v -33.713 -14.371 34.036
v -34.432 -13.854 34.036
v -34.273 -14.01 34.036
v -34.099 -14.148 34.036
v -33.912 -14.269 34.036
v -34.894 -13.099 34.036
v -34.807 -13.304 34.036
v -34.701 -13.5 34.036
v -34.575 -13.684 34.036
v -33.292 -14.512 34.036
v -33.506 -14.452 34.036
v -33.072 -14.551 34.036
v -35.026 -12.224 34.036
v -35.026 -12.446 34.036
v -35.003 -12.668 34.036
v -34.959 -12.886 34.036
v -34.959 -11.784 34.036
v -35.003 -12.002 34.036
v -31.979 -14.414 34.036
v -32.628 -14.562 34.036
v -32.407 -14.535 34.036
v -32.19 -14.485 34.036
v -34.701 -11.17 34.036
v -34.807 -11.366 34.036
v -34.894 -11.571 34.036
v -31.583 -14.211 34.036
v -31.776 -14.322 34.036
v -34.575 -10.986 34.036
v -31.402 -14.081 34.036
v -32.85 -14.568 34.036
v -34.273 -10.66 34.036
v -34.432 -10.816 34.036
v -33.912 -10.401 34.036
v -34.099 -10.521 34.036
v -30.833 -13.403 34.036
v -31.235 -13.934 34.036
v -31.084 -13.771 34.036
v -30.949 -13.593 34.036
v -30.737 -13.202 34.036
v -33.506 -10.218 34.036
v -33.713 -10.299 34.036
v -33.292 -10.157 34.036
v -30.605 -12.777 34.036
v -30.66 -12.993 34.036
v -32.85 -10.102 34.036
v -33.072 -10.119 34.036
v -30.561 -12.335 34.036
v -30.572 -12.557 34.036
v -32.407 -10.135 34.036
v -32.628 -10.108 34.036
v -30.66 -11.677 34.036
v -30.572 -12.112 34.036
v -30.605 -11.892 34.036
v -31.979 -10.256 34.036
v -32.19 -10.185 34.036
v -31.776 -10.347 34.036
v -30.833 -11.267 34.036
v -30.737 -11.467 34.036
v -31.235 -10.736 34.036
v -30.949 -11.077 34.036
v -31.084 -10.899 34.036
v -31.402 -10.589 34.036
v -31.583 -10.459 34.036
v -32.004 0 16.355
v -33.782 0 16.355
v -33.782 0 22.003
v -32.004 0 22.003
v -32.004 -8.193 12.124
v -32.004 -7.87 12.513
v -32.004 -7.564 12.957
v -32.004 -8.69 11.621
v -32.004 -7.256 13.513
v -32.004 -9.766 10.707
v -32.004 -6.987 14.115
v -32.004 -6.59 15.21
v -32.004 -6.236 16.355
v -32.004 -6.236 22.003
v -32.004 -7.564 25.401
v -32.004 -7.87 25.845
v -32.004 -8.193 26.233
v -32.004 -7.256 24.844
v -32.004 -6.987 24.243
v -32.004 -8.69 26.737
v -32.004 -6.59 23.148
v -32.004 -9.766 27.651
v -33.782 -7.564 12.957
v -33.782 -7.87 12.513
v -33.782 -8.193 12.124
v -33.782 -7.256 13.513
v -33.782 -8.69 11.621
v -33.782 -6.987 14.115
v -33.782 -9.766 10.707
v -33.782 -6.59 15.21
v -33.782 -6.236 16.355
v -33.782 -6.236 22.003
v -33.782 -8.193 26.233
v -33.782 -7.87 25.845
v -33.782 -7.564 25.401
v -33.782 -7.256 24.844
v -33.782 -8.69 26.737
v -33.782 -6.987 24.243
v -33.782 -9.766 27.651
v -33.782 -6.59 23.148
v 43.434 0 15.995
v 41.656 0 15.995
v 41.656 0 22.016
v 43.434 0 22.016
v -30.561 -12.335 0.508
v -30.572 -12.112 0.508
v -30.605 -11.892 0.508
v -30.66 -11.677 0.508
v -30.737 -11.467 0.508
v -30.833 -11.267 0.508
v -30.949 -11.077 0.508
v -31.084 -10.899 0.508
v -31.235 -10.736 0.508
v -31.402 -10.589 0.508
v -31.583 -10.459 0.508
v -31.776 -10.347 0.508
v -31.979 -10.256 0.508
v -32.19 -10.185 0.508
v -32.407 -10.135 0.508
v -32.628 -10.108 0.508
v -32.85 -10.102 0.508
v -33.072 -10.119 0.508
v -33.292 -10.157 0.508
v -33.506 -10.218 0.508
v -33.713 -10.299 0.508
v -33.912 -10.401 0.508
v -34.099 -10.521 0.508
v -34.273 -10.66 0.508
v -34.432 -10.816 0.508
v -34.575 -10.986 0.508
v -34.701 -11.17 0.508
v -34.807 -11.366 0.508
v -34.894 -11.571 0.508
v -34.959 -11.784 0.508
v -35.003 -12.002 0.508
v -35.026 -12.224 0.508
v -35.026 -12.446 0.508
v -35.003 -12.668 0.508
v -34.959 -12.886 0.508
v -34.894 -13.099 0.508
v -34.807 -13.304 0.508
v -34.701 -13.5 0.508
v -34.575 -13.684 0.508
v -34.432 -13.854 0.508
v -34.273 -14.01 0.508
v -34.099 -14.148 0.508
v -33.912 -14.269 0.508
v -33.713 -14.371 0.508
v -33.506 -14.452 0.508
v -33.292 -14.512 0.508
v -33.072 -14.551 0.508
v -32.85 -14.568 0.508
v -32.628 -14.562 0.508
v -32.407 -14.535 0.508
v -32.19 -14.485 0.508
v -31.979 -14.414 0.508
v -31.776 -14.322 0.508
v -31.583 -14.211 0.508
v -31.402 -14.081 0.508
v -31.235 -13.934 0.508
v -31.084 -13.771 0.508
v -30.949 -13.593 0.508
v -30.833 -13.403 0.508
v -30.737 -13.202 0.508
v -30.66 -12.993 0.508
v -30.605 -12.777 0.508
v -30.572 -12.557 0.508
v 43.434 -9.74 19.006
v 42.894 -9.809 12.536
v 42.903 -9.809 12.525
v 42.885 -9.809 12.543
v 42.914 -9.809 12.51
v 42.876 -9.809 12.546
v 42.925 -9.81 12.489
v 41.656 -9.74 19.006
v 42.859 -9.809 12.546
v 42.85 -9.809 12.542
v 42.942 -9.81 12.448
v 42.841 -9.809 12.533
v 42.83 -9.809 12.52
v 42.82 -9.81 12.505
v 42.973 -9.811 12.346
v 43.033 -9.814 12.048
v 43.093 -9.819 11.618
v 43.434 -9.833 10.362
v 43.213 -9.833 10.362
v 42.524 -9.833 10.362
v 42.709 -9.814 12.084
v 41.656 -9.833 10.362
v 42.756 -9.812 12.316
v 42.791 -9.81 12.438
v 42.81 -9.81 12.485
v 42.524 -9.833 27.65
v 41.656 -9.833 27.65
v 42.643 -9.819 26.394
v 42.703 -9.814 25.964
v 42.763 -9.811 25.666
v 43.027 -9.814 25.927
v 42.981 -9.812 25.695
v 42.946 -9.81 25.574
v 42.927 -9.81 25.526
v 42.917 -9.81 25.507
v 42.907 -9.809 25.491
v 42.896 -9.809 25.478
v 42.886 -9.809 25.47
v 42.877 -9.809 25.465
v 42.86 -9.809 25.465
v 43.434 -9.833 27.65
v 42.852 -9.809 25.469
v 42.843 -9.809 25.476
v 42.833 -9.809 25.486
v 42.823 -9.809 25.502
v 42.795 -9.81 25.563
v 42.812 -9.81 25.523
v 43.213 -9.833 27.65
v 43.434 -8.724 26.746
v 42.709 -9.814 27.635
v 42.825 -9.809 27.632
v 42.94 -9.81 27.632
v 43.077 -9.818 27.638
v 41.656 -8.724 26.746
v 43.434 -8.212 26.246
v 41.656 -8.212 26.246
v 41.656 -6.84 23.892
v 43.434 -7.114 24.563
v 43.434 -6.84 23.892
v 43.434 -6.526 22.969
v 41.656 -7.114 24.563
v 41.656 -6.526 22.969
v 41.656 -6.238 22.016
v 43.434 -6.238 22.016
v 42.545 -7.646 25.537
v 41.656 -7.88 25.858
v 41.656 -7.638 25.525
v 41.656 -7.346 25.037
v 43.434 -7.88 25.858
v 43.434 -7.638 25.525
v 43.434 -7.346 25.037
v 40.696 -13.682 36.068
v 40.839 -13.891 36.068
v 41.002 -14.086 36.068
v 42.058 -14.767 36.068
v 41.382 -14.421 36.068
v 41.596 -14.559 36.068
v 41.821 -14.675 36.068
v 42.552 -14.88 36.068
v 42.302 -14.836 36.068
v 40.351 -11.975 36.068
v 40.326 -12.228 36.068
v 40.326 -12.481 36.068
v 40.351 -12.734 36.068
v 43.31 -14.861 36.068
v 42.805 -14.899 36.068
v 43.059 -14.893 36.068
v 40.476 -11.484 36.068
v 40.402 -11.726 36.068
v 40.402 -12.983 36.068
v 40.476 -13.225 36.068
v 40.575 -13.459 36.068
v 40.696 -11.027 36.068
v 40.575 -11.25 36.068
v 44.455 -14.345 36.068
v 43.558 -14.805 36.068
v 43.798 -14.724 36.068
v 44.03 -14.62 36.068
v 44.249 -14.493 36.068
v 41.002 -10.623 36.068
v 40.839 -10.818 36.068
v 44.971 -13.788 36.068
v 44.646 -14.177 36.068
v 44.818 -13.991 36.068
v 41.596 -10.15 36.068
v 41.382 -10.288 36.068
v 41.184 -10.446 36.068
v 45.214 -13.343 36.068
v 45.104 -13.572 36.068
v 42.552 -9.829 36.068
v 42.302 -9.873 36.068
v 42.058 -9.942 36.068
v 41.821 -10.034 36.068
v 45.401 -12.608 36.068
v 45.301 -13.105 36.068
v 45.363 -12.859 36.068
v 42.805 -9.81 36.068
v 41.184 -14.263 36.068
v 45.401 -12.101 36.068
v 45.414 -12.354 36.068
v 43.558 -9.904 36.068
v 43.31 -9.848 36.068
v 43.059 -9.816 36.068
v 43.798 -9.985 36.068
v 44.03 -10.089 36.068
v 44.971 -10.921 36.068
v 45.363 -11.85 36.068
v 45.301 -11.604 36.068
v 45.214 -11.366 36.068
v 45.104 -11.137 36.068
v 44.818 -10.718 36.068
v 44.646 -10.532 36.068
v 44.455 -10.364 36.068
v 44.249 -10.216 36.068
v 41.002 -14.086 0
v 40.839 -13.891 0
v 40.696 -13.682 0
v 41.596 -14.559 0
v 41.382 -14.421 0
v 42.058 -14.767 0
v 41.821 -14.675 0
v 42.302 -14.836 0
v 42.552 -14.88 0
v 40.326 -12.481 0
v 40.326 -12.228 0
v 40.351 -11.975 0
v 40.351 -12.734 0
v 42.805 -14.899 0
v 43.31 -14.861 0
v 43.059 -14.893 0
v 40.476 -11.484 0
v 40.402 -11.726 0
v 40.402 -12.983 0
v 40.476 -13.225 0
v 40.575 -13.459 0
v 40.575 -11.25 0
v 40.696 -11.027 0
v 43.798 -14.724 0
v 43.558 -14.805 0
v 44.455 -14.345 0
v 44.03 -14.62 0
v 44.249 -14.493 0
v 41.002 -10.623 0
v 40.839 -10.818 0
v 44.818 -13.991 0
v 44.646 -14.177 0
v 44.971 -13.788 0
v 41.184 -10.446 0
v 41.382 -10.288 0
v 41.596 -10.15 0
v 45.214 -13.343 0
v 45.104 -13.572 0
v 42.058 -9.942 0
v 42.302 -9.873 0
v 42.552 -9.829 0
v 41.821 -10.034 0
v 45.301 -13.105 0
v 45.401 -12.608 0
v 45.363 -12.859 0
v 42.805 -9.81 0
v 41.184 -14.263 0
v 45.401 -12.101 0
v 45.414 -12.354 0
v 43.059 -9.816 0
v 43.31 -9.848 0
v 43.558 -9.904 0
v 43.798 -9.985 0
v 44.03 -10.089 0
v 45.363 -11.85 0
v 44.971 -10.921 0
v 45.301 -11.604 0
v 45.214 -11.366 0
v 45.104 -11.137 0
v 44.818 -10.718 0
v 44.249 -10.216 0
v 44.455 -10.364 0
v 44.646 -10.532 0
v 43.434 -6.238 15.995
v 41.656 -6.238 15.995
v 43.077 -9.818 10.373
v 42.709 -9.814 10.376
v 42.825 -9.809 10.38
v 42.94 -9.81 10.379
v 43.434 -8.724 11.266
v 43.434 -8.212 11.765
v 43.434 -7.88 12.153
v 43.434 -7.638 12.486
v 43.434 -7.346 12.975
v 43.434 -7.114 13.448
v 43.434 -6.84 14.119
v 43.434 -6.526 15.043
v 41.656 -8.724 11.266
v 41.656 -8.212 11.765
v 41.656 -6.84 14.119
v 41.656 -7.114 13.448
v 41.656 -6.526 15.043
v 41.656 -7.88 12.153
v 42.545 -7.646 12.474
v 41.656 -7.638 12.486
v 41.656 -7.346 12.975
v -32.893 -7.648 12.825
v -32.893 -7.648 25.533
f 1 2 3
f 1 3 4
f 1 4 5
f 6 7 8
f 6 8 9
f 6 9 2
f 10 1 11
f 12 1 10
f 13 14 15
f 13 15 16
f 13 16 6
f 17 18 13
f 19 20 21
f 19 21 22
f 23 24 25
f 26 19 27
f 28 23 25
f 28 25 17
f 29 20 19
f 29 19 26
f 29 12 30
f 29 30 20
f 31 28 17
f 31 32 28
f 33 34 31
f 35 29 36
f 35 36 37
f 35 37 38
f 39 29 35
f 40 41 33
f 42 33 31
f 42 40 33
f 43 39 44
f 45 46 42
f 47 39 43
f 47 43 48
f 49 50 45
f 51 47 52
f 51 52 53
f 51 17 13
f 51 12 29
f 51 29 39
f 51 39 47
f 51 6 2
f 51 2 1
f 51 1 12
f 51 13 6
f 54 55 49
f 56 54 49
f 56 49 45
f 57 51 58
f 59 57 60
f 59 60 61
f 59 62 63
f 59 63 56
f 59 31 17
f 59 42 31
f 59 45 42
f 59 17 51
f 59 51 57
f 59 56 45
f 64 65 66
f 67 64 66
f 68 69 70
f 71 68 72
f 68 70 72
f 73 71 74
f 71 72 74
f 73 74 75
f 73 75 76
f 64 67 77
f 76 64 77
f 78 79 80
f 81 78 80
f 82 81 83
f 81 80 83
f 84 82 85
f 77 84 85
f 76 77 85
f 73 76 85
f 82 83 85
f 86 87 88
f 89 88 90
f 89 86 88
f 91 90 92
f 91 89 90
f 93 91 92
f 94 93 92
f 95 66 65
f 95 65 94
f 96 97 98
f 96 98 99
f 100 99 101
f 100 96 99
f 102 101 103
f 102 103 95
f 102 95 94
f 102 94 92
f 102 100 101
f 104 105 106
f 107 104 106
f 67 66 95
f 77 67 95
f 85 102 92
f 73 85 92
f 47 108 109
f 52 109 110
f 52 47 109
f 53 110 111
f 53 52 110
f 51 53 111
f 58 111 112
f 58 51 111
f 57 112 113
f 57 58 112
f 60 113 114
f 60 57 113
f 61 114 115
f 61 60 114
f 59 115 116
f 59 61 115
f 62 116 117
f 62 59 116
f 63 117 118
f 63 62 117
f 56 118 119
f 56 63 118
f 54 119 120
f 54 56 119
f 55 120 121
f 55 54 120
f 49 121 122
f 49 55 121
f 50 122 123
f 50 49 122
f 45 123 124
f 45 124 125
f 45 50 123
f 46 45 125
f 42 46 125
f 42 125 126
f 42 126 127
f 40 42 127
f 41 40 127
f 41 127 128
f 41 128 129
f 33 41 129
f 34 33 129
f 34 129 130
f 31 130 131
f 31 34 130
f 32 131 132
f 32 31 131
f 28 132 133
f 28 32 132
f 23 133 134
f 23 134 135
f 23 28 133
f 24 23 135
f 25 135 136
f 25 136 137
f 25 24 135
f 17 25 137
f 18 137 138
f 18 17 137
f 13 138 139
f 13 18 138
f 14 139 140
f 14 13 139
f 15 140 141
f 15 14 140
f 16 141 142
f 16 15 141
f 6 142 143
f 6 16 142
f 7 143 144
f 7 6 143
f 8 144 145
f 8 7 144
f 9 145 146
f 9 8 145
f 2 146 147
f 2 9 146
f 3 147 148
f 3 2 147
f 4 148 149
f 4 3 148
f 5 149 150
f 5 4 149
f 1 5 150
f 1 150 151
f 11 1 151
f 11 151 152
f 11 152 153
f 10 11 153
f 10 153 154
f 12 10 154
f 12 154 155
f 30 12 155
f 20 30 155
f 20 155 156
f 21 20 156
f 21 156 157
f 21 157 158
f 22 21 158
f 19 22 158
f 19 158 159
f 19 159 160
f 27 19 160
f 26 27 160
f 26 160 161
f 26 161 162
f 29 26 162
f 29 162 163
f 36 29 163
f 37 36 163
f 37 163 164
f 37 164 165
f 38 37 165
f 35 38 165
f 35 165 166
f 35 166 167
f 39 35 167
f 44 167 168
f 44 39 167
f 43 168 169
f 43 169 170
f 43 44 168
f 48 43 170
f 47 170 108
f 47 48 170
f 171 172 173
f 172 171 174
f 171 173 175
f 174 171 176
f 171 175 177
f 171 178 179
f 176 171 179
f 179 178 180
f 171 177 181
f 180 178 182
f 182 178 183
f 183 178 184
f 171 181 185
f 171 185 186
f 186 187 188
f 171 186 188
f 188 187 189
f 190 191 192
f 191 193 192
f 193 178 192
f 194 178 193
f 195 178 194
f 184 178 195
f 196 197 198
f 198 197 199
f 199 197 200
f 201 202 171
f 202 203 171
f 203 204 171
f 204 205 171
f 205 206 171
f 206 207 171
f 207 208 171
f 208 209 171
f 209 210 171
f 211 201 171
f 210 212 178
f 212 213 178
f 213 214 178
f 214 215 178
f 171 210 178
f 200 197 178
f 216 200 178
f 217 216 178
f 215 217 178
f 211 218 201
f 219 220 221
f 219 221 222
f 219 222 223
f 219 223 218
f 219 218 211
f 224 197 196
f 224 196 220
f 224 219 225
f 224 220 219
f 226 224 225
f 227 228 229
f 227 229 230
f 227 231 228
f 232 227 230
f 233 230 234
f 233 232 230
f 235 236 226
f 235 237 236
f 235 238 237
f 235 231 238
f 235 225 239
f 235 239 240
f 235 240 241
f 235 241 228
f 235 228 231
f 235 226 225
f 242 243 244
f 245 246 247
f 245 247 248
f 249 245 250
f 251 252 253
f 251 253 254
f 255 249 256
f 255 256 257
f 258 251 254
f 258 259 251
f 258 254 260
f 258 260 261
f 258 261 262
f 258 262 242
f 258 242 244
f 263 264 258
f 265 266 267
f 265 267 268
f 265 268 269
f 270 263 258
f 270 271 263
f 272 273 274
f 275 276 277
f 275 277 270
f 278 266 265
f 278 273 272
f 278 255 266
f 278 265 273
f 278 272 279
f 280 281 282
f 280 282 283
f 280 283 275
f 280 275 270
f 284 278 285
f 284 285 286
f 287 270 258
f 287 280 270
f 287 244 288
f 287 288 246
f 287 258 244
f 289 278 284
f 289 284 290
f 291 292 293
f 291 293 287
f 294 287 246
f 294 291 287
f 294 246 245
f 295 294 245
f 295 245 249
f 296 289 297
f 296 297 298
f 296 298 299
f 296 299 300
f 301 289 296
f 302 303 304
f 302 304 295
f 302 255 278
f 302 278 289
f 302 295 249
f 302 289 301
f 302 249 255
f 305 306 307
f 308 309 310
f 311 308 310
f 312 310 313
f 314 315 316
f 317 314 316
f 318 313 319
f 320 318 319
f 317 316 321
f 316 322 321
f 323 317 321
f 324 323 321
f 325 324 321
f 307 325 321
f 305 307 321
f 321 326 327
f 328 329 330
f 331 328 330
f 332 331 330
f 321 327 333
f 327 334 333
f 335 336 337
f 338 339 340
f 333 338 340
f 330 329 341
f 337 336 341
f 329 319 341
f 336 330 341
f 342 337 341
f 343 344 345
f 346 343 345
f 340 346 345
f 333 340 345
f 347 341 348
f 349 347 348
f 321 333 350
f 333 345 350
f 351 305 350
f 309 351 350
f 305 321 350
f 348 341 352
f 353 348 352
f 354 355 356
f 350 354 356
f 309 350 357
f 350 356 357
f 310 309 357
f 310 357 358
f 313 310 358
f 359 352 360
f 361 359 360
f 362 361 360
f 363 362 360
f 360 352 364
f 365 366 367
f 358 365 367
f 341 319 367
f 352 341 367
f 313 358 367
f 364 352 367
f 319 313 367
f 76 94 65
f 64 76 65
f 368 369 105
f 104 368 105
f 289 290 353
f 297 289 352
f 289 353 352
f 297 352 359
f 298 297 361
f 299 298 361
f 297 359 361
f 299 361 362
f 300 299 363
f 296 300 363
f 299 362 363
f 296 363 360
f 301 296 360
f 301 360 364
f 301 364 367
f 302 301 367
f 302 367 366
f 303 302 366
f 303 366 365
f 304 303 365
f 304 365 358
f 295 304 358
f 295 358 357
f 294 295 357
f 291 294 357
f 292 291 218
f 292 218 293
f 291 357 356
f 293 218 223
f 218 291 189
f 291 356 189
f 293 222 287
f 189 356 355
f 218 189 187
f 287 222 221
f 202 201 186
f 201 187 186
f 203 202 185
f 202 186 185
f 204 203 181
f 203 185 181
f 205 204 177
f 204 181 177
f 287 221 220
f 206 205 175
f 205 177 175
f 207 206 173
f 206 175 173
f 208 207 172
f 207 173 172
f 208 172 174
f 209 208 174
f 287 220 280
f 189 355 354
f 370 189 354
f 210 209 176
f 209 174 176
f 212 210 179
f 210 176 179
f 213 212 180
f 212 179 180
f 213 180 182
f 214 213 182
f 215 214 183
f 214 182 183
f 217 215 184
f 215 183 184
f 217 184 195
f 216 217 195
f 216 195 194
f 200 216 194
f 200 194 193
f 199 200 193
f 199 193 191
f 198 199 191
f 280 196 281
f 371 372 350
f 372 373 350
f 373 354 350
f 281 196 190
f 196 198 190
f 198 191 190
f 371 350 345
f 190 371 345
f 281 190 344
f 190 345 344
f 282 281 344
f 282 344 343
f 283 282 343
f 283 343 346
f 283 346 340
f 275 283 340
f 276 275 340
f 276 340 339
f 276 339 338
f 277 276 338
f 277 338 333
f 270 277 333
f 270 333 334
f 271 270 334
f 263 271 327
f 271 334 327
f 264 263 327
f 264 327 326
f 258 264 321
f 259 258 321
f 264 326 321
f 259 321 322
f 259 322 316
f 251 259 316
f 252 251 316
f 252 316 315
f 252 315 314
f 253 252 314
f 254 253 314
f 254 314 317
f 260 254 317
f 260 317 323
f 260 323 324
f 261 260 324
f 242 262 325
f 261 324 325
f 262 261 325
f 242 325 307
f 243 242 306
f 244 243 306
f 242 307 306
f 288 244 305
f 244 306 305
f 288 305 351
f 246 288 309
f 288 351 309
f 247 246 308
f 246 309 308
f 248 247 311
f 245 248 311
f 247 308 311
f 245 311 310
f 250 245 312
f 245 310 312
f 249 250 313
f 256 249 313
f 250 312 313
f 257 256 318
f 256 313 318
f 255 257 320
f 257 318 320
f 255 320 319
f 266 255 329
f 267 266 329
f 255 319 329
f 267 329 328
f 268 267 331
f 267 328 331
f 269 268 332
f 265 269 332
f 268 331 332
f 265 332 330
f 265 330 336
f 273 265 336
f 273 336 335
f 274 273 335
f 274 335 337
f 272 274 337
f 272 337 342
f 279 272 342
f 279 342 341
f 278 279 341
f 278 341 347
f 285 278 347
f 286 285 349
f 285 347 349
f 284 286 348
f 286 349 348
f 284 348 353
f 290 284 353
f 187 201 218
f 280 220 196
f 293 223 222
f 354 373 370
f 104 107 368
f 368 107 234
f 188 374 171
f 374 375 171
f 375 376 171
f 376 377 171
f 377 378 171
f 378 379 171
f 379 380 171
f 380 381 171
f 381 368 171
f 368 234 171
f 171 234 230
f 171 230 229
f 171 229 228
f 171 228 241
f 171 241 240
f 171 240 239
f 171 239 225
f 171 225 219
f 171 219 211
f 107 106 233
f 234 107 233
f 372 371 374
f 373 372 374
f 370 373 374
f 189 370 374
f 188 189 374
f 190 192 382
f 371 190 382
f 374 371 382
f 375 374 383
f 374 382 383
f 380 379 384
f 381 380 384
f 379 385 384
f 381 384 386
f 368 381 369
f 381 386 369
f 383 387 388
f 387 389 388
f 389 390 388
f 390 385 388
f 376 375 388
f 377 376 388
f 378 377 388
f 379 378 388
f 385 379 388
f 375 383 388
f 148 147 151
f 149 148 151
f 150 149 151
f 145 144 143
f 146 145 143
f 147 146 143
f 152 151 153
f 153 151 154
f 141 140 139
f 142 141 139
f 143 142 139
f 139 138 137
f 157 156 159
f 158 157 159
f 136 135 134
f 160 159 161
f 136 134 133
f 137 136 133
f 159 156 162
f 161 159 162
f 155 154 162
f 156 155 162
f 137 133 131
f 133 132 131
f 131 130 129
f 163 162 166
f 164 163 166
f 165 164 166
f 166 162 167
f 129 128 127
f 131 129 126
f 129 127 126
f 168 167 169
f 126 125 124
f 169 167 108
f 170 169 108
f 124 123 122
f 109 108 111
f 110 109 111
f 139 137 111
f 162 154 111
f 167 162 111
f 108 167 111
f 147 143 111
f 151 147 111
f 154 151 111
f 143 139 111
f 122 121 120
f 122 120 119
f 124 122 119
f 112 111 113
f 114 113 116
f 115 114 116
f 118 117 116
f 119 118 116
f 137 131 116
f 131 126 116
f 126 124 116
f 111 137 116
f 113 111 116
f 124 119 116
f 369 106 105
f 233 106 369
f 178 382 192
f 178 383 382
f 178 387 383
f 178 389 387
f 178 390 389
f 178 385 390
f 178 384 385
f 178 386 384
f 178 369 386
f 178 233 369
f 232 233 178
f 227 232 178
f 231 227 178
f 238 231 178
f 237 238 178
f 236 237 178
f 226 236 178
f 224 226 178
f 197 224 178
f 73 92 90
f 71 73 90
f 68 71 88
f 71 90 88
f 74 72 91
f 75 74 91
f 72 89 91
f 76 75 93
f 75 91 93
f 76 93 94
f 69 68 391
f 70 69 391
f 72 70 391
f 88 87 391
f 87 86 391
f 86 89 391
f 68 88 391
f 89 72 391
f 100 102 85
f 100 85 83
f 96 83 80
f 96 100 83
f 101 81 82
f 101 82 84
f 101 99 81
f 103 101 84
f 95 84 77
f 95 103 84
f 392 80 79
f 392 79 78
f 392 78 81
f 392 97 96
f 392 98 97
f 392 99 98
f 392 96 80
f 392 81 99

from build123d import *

# Parameters (mm, degrees)
F15_R     = 2.2335856761
F16_DEPTH = 33.528
F17_R     = 2.5454196351
F18_DEPTH = 36.068
F21_DEPTH = 1.778
F24_DEPTH = 1.778


# Not quite as in the source:
# - the program builds the solid bodies; features that only make, move or delete a surface that nothing else refers to are left out


with BuildPart() as f16:
    # F15 (on offset) → F16 (new body)
    with BuildSketch(Plane.XY.offset(34.036)):
        with Locations((-32.7947326005, -12.3348757625)):
            Circle(F15_R)
    extrude(amount=-F16_DEPTH)


with BuildPart() as f18:
    # F17 (on Top) → F18 (new body)
    with BuildSketch(Plane.XY):
        with Locations((42.8683161736, -12.3544856906)):
            Circle(F17_R)
    extrude(amount=F18_DEPTH)

    # F23 (on offset) → F24 (join)
    with BuildSketch(Plane.YZ.offset(41.656)):
        with BuildLine():
            add(Edge.make_bspline(
                [(-9.8325097933, 27.6496764272), (-9.0307658036, 27.0274098331), (-7.333639855, 25.7102003531), (-6.6161287383, 23.2921278525), (-6.237579044, 22.0163837075)],
                knots=[0, 0, 0, 0, 0.4724127814, 1, 1, 1, 1], degree=3))
            Line((-9.8325097933, 27.6496764272), (-9.7397938371, 19.0057530999))
            Line((-9.7397938371, 19.0057530999), (-9.8325097933, 10.3618297726))
            add(Edge.make_bspline(
                [(-9.8325097933, 10.3618297726), (-9.0307658036, 10.9840963667), (-7.333639855, 12.3013058467), (-6.6161287383, 14.7193783474), (-6.237579044, 15.9951224923)],
                knots=[0, 0, 0, 0, 0.4724127814, 1, 1, 1, 1], degree=3))
            Line((-6.237579044, 15.9951224923), (0, 15.9951224923))
            Line((0, 15.9951224923), (0, 19.0057530999))
            Line((0, 19.0057530999), (0, 22.0163837075))
            Line((0, 22.0163837075), (-6.237579044, 22.0163837075))
        make_face()
    extrude(amount=F24_DEPTH)


with BuildPart() as f21:
    # F20 (on offset) → F21 (new body)
    with BuildSketch(Plane.YZ.offset(-33.782)):
        with BuildLine():
            add(Edge.make_bspline(
                [(-9.7659286112, 27.6505146176), (-8.9921918233, 27.024105619), (-7.3467405515, 25.6919659306), (-6.6207069657, 23.2803554227), (-6.2360744923, 22.0027510077)],
                knots=[0, 0, 0, 0, 0.4702277126, 1, 1, 1, 1], degree=3))
            Line((-9.7659286112, 27.6505146176), (-9.7659286112, 10.7072200626))
            add(Edge.make_bspline(
                [(-9.7659286112, 10.7072200626), (-8.9921918233, 11.3336290612), (-7.3467405515, 12.6657687496), (-6.6207069657, 15.0773792575), (-6.2360744923, 16.3549836725)],
                knots=[0, 0, 0, 0, 0.4702277126, 1, 1, 1, 1], degree=3))
            Line((-6.2360744923, 16.3549836725), (0, 16.3549836725))
            Line((0, 16.3549836725), (0, 19.1788673401))
            Line((0, 19.1788673401), (0, 22.0027510077))
            Line((0, 22.0027510077), (-6.2360744923, 22.0027510077))
        make_face()
    extrude(amount=F21_DEPTH)


solid = Compound([f16.part, f18.part, f21.part])
